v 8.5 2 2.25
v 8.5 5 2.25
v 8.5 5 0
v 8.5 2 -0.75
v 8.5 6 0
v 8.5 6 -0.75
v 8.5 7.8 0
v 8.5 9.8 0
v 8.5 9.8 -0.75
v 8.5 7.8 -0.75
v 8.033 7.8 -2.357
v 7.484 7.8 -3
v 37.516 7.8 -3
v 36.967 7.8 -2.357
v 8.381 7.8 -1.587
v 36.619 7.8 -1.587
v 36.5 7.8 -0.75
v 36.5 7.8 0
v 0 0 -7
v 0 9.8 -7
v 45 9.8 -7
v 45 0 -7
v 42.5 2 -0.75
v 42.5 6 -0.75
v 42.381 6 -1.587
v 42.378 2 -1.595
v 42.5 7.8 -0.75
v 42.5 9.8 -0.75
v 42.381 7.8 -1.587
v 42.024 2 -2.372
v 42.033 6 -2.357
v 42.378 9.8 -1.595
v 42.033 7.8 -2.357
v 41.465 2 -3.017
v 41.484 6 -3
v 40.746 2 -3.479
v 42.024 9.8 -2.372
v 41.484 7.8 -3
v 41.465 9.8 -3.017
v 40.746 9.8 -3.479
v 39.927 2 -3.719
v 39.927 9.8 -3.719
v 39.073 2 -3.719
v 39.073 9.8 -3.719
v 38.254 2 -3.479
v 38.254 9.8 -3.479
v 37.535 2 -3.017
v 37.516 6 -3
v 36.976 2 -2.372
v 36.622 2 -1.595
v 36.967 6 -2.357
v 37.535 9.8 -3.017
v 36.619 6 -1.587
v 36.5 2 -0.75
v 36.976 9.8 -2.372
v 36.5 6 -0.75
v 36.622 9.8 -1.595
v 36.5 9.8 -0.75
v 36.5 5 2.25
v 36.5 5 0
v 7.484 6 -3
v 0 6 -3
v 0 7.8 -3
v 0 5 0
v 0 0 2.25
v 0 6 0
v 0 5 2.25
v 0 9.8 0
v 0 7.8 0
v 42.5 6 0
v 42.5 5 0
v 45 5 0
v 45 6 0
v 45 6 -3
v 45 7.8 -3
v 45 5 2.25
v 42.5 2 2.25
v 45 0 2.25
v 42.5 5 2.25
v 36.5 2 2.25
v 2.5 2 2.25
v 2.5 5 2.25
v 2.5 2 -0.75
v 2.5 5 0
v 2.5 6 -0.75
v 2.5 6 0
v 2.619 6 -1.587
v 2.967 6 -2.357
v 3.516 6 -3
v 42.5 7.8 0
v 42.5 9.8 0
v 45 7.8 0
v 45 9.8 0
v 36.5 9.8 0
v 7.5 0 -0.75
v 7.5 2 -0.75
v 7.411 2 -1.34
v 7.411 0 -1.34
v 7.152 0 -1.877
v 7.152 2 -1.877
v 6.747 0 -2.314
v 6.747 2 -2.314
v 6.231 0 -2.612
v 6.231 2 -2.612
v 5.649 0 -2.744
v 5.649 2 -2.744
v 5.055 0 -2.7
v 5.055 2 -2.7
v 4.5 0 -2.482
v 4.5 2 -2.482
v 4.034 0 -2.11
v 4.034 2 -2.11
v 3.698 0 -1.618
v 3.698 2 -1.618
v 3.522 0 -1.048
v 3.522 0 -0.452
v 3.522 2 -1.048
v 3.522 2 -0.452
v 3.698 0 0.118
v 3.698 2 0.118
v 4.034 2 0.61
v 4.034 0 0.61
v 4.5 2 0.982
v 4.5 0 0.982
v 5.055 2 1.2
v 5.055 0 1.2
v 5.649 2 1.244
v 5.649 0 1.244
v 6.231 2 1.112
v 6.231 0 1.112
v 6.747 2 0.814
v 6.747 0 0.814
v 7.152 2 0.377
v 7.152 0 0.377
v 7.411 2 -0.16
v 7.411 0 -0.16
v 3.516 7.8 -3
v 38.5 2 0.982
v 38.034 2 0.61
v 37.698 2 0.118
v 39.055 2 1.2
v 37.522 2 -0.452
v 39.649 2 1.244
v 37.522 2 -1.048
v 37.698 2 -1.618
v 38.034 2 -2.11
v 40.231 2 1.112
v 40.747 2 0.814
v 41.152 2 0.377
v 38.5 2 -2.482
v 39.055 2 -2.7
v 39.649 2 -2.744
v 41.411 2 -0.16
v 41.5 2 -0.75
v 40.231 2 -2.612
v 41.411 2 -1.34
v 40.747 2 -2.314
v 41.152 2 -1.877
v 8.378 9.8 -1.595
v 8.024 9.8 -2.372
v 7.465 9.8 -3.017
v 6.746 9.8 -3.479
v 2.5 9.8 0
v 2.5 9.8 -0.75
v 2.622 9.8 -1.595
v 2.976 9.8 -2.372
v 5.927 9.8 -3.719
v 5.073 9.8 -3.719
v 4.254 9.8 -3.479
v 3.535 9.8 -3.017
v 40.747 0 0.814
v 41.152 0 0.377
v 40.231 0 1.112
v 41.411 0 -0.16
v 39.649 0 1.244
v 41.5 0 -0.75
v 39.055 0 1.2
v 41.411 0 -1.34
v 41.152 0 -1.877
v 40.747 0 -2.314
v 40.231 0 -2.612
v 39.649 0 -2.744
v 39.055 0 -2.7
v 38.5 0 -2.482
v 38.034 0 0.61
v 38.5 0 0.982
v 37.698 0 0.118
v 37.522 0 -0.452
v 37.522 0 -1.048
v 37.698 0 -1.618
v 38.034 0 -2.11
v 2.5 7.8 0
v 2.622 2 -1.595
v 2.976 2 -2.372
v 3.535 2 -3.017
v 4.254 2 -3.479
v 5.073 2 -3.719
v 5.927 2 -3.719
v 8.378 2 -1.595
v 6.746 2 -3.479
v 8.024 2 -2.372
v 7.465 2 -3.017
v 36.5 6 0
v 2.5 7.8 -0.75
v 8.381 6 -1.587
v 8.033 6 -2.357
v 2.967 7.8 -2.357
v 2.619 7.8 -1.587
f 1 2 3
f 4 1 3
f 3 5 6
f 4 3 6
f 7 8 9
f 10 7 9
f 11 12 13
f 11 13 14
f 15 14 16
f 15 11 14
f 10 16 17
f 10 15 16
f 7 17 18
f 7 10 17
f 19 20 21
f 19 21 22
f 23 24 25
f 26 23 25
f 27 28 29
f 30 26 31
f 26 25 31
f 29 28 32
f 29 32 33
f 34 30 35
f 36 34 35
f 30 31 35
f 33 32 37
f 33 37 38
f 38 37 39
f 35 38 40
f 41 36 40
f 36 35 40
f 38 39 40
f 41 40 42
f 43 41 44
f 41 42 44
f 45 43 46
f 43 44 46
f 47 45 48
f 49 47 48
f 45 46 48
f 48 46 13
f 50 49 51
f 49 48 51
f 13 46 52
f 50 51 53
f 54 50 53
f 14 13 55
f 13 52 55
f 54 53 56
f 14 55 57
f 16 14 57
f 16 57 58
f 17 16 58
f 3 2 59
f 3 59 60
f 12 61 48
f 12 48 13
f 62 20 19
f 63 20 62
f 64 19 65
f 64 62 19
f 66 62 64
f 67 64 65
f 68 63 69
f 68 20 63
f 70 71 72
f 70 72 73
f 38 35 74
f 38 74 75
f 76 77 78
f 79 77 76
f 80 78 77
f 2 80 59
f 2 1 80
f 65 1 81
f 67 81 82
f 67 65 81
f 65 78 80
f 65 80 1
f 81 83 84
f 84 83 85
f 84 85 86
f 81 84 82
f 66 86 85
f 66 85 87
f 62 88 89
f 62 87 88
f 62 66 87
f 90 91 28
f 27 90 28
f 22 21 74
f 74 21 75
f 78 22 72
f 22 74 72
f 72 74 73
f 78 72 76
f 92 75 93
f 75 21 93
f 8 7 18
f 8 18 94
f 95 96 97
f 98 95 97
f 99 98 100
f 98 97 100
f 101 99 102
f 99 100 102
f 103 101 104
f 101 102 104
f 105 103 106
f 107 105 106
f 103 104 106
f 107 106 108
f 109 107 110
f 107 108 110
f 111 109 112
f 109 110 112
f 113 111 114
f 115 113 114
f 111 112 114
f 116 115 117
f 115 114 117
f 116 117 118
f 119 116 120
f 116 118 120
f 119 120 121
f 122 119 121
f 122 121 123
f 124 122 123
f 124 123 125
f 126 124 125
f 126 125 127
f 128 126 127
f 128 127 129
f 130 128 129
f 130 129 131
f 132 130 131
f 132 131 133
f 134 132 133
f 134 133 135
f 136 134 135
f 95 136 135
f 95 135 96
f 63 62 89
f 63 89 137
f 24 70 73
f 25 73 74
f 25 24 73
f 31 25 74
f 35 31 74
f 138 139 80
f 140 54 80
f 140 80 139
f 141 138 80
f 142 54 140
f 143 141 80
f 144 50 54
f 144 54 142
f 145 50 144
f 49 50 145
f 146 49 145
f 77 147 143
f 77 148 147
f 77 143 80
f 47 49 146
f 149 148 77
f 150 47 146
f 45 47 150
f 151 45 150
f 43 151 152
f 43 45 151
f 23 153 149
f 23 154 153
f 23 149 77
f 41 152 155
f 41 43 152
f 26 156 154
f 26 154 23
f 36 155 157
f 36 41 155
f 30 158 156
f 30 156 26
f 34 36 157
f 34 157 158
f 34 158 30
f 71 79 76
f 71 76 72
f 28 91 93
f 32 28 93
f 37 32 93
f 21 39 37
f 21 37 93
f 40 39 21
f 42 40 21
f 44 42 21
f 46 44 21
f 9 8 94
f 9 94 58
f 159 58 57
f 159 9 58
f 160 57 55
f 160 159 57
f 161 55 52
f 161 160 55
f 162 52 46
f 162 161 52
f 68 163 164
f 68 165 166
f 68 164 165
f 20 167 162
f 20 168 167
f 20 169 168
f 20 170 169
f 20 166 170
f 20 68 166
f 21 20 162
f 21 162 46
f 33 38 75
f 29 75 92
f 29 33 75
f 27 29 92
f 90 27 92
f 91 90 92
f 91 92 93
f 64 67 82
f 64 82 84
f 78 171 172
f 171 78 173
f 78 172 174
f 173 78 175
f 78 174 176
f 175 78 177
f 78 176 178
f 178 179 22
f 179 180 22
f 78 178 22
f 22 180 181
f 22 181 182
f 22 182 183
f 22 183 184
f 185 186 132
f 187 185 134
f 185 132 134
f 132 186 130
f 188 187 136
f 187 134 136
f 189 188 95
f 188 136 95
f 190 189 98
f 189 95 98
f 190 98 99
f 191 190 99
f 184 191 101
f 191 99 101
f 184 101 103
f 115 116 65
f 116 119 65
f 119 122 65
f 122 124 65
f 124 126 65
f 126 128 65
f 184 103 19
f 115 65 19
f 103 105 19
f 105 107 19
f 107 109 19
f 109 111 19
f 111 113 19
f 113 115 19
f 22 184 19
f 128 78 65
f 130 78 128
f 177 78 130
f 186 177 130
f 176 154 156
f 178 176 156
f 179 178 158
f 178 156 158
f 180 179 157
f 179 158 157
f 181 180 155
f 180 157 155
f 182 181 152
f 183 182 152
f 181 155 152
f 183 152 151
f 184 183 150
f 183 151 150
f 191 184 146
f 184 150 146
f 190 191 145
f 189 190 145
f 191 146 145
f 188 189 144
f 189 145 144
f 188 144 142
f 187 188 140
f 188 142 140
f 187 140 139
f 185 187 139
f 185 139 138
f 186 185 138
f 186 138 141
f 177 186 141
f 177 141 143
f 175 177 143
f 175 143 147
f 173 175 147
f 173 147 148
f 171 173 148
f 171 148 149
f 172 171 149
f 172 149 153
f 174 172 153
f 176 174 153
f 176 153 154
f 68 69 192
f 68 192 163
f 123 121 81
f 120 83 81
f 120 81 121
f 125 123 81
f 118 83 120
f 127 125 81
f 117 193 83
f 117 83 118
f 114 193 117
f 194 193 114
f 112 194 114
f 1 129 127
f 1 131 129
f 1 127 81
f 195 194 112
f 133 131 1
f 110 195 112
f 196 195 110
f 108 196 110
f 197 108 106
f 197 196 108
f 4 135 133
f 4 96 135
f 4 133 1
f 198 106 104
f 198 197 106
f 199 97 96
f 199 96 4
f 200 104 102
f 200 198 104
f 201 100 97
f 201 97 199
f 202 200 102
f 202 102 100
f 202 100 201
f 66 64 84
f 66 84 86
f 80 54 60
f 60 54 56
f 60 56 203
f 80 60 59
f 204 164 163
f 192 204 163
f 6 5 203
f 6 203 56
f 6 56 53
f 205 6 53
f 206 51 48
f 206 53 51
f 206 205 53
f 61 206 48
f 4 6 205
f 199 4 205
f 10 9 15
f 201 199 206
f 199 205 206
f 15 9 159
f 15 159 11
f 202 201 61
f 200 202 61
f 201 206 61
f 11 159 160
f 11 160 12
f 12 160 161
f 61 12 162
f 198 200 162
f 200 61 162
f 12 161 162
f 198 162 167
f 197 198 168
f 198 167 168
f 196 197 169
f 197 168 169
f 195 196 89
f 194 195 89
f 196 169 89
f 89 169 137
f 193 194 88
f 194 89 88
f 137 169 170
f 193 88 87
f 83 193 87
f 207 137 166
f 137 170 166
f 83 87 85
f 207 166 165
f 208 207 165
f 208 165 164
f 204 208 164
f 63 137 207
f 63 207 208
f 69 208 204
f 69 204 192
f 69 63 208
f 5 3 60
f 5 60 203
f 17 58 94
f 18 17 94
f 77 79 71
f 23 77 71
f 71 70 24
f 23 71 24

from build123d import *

# Parameters (mm, degrees)
EXTRUDE_1_DEPTH     = 45
SKETCH_2_R          = 2
CUT_EXTRUDE_1_DEPTH = 10.8
CUT_EXTRUDE_2_DEPTH = 7.8


with BuildPart() as part:
    # Эскиз1 → Бобышка-Вытянуть1 (new body)
    with BuildSketch(Plane(origin=(0, 0, 0), x_dir=(0, 0, -1), z_dir=(1, 0, 0))):
        Polygon((0, 5), (0, 6), (3, 6), (3, 7.8), (0, 7.8), (0, 9.8), (7, 9.8), (7, 0), (0, 0), (-2.25, 0), (-2.25, 5), align=None)
    extrude(amount=EXTRUDE_1_DEPTH)

    # Эскиз2 → Вырез-Вытянуть1 (cut, through all)
    with BuildSketch(Plane(origin=(0, 9.8, 0), x_dir=(1, 0, 0), z_dir=(0, 1, 0))):
        with Locations((5.5, 0.75)):
            Circle(SKETCH_2_R)
        with Locations((39.5, 0.75)):
            Circle(SKETCH_2_R)
    extrude(amount=-CUT_EXTRUDE_1_DEPTH, mode=Mode.SUBTRACT)

    # Эскиз3 → Вырез-Вытянуть2 (cut)
    with BuildSketch(Plane(origin=(0, 9.8, 0), x_dir=(1, 0, 0), z_dir=(0, 1, 0))):
        with BuildLine():
            Line((2.5, 0.75), (2.5, -2.25))
            Line((2.5, -2.25), (8.5, -2.25))
            Line((8.5, -2.25), (8.5, 0.75))
            ThreePointArc((8.5, 0.75), (5.5, 3.75), (2.5, 0.75))
        make_face()
        with BuildLine():
            Line((36.5, 0.75), (36.5, -2.25))
            Line((36.5, -2.25), (42.5, -2.25))
            Line((42.5, -2.25), (42.5, 0.75))
            ThreePointArc((42.5, 0.75), (39.5, 3.75), (36.5, 0.75))
        make_face()
    extrude(amount=-CUT_EXTRUDE_2_DEPTH, mode=Mode.SUBTRACT)


solid = part.part
